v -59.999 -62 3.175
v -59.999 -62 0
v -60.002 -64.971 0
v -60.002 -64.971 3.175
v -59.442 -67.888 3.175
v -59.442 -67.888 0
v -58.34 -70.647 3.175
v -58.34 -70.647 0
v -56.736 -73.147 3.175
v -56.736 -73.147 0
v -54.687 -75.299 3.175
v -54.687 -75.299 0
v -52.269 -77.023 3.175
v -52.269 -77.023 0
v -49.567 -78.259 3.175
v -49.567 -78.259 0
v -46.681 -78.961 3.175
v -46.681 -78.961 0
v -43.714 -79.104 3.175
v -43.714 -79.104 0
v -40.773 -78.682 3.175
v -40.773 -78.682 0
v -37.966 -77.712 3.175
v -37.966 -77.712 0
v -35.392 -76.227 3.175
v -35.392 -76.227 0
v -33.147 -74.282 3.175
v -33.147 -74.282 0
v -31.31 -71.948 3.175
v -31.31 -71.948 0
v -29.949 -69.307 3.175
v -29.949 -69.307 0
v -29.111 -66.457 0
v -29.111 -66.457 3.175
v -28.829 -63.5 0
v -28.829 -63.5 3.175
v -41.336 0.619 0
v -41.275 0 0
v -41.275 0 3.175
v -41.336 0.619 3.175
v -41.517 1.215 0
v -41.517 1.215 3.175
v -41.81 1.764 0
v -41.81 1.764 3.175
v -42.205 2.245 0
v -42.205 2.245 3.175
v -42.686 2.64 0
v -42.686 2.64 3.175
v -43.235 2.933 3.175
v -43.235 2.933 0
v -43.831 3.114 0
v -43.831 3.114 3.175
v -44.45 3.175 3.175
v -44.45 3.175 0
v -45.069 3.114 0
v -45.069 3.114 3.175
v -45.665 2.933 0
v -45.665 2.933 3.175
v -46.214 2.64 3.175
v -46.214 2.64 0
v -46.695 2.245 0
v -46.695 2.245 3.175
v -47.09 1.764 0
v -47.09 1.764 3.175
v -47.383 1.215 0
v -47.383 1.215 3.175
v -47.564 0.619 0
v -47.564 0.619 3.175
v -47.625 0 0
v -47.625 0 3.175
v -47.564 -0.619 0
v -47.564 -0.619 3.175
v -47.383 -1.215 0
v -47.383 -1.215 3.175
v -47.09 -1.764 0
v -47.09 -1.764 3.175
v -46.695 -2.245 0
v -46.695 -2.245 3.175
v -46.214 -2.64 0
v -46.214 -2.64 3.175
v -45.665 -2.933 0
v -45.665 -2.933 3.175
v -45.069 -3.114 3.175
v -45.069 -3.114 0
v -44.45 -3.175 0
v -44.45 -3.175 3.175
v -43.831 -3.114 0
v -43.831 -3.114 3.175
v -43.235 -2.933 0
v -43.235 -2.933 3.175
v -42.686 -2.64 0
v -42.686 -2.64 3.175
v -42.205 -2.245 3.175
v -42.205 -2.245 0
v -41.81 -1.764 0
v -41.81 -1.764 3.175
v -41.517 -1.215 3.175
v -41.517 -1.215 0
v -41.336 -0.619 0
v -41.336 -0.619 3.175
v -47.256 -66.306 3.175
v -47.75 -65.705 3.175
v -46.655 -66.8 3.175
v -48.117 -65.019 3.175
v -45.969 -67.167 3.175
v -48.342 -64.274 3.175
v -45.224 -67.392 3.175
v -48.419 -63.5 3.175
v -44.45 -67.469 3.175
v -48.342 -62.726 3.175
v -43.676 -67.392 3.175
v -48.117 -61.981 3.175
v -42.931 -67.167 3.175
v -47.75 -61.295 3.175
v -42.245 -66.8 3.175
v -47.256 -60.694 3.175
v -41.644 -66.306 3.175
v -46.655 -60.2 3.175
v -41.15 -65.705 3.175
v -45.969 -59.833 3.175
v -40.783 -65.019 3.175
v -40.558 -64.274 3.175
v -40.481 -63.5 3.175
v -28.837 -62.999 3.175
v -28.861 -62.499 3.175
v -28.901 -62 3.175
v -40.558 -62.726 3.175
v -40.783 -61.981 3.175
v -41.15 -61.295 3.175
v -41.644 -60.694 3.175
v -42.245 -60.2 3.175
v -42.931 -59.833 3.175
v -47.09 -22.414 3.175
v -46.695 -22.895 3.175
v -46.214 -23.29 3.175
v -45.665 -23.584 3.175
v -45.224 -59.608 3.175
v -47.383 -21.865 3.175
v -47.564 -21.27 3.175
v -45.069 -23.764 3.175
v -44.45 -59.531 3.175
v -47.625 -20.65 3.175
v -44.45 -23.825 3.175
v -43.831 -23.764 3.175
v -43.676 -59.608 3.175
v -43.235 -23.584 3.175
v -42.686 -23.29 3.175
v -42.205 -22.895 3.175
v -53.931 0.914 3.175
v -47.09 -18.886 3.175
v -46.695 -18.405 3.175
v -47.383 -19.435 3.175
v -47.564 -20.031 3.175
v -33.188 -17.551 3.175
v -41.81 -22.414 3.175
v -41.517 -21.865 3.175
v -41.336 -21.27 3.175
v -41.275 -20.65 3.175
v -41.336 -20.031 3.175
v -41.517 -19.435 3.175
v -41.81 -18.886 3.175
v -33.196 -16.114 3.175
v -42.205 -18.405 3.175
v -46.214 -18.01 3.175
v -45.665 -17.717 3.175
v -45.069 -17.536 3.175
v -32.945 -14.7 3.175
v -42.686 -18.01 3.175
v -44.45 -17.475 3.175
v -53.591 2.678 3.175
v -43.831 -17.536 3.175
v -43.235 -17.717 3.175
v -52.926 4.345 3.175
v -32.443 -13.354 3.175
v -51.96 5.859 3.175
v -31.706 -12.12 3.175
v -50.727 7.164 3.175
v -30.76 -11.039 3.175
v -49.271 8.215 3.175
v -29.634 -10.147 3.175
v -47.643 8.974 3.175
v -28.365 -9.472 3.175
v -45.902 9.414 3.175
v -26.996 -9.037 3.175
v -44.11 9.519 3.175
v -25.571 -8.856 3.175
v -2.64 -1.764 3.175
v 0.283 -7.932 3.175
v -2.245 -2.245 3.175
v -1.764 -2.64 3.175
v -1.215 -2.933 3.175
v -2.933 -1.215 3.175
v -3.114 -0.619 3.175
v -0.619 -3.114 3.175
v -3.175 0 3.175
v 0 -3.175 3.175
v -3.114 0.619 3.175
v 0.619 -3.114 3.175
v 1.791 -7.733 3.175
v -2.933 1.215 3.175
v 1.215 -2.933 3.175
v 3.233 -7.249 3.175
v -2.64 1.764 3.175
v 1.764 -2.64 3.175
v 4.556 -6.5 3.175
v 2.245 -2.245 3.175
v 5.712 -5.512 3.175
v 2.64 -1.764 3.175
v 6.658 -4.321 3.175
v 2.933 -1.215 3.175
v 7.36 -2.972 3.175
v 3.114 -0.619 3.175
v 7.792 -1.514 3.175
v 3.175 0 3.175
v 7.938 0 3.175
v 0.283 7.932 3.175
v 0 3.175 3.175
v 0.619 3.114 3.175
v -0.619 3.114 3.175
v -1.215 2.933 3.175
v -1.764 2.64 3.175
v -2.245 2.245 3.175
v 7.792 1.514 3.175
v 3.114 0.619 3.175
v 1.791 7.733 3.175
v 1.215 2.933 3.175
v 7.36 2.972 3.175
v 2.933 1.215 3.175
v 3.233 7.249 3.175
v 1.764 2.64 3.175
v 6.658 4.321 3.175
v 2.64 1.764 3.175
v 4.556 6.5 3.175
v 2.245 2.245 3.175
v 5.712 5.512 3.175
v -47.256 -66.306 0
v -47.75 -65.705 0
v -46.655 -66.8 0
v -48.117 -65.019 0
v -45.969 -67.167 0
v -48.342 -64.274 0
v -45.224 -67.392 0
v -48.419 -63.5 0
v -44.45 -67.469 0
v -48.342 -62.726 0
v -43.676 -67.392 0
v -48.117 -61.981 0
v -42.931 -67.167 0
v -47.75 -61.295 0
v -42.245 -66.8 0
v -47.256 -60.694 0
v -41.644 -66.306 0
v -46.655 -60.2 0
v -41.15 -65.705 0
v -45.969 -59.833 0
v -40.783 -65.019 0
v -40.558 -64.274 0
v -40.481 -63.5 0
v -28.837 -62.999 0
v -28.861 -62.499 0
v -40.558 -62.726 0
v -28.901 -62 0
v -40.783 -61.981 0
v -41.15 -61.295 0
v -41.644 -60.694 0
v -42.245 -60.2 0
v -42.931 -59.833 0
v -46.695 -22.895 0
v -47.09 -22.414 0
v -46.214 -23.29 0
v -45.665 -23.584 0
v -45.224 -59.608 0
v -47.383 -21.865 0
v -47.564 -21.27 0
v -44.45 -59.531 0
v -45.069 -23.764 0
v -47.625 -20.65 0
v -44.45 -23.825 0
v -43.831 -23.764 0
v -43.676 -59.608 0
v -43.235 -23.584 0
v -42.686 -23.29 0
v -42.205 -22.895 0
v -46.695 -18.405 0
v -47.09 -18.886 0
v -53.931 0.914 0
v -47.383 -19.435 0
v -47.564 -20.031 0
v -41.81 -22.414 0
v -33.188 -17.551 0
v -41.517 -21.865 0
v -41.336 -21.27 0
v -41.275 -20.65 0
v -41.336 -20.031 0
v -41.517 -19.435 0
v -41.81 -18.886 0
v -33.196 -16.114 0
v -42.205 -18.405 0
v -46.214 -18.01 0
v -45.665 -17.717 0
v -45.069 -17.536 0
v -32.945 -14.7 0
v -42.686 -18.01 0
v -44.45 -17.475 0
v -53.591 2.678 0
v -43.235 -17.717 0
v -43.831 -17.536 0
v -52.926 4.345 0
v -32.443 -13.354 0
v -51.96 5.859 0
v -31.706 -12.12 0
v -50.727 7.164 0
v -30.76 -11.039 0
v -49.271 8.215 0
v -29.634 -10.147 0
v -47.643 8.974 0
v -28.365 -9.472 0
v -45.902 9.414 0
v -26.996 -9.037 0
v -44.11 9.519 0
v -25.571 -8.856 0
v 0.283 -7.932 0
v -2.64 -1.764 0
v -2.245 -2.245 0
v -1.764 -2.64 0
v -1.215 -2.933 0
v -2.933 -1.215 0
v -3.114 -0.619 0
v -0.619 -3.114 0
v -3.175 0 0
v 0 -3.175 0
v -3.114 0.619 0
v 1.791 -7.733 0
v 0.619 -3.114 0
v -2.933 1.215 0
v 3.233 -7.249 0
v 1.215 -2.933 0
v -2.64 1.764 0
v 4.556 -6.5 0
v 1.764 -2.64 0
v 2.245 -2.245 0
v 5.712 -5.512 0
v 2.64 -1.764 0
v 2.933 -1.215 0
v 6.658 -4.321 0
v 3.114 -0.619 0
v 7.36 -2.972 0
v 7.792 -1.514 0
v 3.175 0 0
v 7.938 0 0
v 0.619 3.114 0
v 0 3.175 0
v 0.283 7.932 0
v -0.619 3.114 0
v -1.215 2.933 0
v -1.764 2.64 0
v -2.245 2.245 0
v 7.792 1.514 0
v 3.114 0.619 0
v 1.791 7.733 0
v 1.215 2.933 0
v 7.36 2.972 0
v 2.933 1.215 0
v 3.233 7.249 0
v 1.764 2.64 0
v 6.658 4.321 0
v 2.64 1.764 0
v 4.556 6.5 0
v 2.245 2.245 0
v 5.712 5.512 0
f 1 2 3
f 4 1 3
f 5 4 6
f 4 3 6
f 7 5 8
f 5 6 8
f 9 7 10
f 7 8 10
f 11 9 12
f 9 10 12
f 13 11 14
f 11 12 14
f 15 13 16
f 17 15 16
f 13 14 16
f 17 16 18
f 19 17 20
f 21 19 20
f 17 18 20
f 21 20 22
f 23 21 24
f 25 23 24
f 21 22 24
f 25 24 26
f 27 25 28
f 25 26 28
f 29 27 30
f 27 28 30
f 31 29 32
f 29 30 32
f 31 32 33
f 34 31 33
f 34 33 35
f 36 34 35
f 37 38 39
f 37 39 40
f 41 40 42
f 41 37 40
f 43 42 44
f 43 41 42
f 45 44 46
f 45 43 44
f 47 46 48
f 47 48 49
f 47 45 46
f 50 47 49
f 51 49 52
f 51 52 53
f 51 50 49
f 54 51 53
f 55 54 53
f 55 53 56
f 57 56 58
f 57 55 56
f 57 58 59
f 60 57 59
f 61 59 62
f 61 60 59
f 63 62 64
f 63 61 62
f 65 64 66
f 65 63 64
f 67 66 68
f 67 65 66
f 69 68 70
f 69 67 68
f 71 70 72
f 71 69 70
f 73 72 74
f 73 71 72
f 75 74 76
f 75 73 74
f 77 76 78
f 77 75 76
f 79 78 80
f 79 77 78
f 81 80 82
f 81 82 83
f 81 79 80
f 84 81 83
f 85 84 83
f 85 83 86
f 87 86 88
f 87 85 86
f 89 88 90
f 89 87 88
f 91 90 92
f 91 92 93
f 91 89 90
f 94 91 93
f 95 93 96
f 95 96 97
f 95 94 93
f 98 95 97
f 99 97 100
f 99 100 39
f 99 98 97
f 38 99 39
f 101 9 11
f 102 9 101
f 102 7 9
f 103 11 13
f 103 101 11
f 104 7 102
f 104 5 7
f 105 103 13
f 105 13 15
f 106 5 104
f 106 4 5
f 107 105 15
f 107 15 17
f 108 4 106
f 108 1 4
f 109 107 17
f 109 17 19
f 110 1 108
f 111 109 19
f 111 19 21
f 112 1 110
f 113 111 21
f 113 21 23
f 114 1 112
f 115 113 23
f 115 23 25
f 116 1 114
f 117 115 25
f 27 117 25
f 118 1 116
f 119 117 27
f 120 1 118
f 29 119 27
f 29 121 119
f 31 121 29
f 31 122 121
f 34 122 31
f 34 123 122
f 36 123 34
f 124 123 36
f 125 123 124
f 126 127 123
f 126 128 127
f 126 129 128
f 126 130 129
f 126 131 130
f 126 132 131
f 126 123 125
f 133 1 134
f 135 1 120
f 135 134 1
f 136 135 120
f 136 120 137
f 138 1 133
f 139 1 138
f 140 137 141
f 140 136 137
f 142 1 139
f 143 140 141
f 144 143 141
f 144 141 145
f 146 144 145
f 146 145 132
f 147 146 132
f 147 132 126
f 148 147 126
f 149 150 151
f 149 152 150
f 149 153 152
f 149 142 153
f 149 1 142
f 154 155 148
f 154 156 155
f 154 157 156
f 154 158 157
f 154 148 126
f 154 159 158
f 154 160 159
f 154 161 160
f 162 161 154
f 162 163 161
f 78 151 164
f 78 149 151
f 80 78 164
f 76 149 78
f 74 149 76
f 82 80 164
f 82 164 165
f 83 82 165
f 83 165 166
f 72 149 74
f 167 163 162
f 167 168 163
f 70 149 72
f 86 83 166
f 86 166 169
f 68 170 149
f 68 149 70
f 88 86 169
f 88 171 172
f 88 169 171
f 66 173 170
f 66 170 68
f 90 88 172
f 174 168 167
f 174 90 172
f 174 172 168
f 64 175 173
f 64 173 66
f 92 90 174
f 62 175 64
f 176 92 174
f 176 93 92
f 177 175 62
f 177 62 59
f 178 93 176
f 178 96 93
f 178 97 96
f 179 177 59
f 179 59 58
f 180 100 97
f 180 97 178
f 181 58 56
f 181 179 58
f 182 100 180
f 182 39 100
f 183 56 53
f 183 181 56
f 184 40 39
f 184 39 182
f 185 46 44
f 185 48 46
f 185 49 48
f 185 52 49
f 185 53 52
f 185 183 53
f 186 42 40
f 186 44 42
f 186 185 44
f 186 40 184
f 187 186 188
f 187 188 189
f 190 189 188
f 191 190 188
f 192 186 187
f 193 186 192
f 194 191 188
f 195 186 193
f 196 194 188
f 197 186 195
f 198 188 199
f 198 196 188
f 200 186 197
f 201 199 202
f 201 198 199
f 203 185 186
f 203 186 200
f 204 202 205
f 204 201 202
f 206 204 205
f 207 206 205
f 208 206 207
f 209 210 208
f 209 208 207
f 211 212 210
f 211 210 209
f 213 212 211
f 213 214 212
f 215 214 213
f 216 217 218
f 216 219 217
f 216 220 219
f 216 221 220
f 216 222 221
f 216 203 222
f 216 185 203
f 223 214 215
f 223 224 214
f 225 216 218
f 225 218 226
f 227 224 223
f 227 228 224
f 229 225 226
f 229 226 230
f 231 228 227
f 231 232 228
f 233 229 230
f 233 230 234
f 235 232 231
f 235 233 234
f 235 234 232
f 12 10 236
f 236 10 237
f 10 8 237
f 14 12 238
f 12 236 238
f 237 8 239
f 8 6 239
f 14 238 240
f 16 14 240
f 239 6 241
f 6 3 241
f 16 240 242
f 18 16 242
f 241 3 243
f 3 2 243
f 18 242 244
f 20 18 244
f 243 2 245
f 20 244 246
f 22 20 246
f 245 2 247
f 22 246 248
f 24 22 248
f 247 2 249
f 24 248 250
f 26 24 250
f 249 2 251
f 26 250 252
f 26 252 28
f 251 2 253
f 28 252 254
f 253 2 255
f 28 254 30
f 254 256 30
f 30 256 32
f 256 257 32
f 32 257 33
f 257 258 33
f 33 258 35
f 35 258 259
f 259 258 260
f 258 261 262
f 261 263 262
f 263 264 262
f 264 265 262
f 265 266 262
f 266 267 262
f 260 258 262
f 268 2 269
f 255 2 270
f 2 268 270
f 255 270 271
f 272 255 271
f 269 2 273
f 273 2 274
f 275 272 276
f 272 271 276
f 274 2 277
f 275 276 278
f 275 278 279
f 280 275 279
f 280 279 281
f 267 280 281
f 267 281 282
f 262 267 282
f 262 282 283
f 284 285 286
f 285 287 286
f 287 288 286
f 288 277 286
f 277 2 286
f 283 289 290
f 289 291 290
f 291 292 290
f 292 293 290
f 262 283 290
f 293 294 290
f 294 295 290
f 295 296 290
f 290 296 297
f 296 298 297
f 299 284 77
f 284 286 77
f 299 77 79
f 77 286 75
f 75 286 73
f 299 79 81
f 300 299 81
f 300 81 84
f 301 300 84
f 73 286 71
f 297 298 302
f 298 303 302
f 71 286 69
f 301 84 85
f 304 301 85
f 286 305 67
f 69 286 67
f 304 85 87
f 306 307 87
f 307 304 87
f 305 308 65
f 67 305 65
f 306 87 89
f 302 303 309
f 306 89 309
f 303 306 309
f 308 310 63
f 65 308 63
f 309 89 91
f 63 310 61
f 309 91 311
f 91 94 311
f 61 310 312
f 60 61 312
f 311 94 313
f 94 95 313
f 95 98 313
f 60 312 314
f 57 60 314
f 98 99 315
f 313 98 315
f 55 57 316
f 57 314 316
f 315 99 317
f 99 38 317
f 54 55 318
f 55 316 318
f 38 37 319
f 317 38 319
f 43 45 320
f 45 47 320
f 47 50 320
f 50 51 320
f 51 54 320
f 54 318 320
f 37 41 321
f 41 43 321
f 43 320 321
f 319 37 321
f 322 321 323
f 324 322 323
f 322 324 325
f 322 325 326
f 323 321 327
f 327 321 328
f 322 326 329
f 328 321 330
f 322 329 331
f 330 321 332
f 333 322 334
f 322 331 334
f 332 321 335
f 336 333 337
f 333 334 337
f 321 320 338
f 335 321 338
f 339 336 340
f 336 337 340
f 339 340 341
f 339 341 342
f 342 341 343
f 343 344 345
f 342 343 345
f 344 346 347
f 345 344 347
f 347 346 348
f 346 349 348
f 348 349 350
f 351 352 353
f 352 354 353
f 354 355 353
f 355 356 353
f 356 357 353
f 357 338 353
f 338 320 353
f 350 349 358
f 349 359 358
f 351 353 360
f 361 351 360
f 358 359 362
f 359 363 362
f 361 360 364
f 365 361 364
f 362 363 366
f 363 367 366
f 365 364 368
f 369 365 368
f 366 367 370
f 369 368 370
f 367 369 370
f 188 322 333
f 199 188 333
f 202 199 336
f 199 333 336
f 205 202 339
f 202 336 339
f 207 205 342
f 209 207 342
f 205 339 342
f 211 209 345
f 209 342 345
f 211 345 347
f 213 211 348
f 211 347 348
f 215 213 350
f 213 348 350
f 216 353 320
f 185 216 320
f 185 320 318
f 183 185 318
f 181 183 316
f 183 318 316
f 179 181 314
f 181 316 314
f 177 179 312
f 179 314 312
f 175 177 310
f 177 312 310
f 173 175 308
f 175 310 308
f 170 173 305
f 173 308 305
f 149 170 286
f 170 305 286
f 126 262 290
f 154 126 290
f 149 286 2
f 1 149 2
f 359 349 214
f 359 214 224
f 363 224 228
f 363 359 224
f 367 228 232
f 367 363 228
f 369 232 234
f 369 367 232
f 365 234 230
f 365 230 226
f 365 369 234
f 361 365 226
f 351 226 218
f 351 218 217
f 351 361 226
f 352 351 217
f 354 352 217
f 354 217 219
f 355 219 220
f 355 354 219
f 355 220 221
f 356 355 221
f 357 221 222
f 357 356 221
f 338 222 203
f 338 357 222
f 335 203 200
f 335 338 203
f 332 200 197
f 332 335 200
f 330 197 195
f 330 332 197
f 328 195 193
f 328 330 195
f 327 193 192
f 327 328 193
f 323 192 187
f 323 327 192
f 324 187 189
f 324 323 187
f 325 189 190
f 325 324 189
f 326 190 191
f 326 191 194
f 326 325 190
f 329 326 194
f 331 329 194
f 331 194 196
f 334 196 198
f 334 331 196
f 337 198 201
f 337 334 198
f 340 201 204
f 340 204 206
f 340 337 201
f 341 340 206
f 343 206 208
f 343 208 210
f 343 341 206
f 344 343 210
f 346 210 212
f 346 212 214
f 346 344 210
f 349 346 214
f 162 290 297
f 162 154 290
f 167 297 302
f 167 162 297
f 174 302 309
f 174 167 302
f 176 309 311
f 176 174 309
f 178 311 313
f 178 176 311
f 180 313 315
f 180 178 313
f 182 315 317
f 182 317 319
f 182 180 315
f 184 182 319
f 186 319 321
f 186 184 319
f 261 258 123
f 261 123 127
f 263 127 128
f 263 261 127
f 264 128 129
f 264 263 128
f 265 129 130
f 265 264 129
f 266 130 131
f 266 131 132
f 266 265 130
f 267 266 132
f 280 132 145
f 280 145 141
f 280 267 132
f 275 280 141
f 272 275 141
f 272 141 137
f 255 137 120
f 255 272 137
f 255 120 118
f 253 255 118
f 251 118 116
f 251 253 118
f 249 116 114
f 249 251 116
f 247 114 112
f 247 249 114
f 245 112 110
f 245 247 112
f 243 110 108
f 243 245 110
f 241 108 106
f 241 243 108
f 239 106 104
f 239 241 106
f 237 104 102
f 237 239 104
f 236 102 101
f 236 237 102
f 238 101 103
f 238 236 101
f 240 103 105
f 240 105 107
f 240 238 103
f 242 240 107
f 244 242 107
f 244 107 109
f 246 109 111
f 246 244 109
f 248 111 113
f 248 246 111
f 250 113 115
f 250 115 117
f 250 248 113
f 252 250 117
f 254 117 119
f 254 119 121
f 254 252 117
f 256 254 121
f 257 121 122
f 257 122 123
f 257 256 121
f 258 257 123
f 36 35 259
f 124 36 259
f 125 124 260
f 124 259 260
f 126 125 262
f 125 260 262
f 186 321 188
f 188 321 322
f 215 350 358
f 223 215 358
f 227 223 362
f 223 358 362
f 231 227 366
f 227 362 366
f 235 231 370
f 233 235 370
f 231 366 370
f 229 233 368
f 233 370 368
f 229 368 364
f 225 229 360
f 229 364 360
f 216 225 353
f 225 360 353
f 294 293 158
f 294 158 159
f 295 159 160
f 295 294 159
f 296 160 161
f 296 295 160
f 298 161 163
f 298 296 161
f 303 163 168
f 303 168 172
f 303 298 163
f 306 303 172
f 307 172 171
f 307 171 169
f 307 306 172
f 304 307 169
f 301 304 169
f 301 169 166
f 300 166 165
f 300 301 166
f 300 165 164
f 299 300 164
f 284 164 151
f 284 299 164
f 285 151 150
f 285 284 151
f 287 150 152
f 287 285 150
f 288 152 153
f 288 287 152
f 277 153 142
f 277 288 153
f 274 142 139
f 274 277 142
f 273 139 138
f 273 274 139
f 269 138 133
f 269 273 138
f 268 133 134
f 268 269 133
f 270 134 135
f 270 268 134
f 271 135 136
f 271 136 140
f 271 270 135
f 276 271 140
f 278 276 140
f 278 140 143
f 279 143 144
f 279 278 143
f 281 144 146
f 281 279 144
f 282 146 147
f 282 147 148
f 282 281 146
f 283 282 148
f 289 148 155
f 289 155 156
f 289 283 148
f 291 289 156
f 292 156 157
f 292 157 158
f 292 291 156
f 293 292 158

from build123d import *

# Parameters (mm, degrees)
F0_R     = 3.175
F0_R_2   = 3.96875
F1_DEPTH = 3.175
F2_R     = 7.9375


with BuildPart() as f1:
    # F0 (on Top) → F1 (new body)
    with BuildSketch(Plane.XY):
        with BuildLine():
            ThreePointArc((0.2834821429, -7.9324362036), (5.7120069047, -5.5115227815), (7.9375, 0))
            ThreePointArc((7.9375, 0), (5.7120069047, 5.5115227815), (0.2834821429, 7.9324362036))
            ThreePointArc((0.2834821429, 7.9324362036), (-7.9375, 0), (0.2834821429, -7.9324362036))
        make_face()
        Circle(F0_R, mode=Mode.SUBTRACT)
        with BuildLine():
            ThreePointArc((0.2834821429, -7.9324362036), (-7.9375, 0), (0.2834821429, 7.9324362036))
            Line((0.2834821429, 7.9324362036), (-44.1098214286, 9.5189234444))
            ThreePointArc((-44.1098214286, 9.5189234444), (-37.9213417577, 6.9355783144), (-34.968992794, 0.9144))
            Line((-34.968992794, 0.9144), (-33.9975998101, -9.157542126))
            Line((-33.9975998101, -9.157542126), (0.2834821429, -7.9324362036))
        make_face()
        with BuildLine():
            ThreePointArc((-34.968992794, 0.9144), (-37.9213417577, 6.9355783144), (-44.1098214286, 9.5189234444))
            ThreePointArc((-44.1098214286, 9.5189234444), (-50.7267940031, 7.1643200684), (-53.931007206, 0.9144))
            ThreePointArc((-53.931007206, 0.9144), (-51.3855783284, -6.5286582275), (-44.1098214693, -9.5189234458))
            ThreePointArc((-44.1098214693, -9.5189234458), (-37.5955917285, -6.6138273524), (-34.925, 0))
            ThreePointArc((-34.925, 0), (-34.9360045555, 0.4577288296), (-34.968992794, 0.9144))
        make_face()
        with Locations((-44.45, 0)):
            Circle(F0_R, mode=Mode.SUBTRACT)
        with BuildLine():
            Line((-28.9011481822, -62.000384), (-33.9975998101, -9.157542126))
            Line((-33.9975998101, -9.157542126), (-44.1098214693, -9.5189234458))
            ThreePointArc((-44.1098214693, -9.5189234458), (-51.3855783284, -6.5286582275), (-53.931007206, 0.9144))
            Line((-53.931007206, 0.9144), (-59.9988518178, -62.000384))
            ThreePointArc((-59.9988518178, -62.000384), (-44.45, -47.879), (-28.9011481822, -62.000384))
        make_face()
        with Locations((-44.45, -20.6502)):
            Circle(F0_R, mode=Mode.SUBTRACT)
        with BuildLine():
            Line((-44.1098214693, -9.5189234458), (-33.9975998101, -9.157542126))
            Line((-33.9975998101, -9.157542126), (-34.968992794, 0.9144))
            ThreePointArc((-34.968992794, 0.9144), (-34.9360045555, 0.4577288296), (-34.925, 0))
            ThreePointArc((-34.925, 0), (-37.5955917285, -6.6138273524), (-44.1098214693, -9.5189234458))
        make_face()
        with BuildLine():
            ThreePointArc((-28.829, -63.5), (-28.847047471, -62.7493247194), (-28.9011481822, -62.000384))
            ThreePointArc((-28.9011481822, -62.000384), (-44.45, -47.879), (-59.9988518178, -62.000384))
            ThreePointArc((-59.9988518178, -62.000384), (-45.2006752806, -79.102952529), (-28.829, -63.5))
        make_face()
        with Locations((-44.45, -63.5)):
            Circle(F0_R_2, mode=Mode.SUBTRACT)
    extrude(amount=F1_DEPTH)

    # F2
    f2_edges = [f1.edges().sort_by_distance(p)[0] for p in [
        (-33.9976, -9.157542, 1.5875),
    ]]
    fillet(f2_edges, radius=F2_R)


solid = f1.part
